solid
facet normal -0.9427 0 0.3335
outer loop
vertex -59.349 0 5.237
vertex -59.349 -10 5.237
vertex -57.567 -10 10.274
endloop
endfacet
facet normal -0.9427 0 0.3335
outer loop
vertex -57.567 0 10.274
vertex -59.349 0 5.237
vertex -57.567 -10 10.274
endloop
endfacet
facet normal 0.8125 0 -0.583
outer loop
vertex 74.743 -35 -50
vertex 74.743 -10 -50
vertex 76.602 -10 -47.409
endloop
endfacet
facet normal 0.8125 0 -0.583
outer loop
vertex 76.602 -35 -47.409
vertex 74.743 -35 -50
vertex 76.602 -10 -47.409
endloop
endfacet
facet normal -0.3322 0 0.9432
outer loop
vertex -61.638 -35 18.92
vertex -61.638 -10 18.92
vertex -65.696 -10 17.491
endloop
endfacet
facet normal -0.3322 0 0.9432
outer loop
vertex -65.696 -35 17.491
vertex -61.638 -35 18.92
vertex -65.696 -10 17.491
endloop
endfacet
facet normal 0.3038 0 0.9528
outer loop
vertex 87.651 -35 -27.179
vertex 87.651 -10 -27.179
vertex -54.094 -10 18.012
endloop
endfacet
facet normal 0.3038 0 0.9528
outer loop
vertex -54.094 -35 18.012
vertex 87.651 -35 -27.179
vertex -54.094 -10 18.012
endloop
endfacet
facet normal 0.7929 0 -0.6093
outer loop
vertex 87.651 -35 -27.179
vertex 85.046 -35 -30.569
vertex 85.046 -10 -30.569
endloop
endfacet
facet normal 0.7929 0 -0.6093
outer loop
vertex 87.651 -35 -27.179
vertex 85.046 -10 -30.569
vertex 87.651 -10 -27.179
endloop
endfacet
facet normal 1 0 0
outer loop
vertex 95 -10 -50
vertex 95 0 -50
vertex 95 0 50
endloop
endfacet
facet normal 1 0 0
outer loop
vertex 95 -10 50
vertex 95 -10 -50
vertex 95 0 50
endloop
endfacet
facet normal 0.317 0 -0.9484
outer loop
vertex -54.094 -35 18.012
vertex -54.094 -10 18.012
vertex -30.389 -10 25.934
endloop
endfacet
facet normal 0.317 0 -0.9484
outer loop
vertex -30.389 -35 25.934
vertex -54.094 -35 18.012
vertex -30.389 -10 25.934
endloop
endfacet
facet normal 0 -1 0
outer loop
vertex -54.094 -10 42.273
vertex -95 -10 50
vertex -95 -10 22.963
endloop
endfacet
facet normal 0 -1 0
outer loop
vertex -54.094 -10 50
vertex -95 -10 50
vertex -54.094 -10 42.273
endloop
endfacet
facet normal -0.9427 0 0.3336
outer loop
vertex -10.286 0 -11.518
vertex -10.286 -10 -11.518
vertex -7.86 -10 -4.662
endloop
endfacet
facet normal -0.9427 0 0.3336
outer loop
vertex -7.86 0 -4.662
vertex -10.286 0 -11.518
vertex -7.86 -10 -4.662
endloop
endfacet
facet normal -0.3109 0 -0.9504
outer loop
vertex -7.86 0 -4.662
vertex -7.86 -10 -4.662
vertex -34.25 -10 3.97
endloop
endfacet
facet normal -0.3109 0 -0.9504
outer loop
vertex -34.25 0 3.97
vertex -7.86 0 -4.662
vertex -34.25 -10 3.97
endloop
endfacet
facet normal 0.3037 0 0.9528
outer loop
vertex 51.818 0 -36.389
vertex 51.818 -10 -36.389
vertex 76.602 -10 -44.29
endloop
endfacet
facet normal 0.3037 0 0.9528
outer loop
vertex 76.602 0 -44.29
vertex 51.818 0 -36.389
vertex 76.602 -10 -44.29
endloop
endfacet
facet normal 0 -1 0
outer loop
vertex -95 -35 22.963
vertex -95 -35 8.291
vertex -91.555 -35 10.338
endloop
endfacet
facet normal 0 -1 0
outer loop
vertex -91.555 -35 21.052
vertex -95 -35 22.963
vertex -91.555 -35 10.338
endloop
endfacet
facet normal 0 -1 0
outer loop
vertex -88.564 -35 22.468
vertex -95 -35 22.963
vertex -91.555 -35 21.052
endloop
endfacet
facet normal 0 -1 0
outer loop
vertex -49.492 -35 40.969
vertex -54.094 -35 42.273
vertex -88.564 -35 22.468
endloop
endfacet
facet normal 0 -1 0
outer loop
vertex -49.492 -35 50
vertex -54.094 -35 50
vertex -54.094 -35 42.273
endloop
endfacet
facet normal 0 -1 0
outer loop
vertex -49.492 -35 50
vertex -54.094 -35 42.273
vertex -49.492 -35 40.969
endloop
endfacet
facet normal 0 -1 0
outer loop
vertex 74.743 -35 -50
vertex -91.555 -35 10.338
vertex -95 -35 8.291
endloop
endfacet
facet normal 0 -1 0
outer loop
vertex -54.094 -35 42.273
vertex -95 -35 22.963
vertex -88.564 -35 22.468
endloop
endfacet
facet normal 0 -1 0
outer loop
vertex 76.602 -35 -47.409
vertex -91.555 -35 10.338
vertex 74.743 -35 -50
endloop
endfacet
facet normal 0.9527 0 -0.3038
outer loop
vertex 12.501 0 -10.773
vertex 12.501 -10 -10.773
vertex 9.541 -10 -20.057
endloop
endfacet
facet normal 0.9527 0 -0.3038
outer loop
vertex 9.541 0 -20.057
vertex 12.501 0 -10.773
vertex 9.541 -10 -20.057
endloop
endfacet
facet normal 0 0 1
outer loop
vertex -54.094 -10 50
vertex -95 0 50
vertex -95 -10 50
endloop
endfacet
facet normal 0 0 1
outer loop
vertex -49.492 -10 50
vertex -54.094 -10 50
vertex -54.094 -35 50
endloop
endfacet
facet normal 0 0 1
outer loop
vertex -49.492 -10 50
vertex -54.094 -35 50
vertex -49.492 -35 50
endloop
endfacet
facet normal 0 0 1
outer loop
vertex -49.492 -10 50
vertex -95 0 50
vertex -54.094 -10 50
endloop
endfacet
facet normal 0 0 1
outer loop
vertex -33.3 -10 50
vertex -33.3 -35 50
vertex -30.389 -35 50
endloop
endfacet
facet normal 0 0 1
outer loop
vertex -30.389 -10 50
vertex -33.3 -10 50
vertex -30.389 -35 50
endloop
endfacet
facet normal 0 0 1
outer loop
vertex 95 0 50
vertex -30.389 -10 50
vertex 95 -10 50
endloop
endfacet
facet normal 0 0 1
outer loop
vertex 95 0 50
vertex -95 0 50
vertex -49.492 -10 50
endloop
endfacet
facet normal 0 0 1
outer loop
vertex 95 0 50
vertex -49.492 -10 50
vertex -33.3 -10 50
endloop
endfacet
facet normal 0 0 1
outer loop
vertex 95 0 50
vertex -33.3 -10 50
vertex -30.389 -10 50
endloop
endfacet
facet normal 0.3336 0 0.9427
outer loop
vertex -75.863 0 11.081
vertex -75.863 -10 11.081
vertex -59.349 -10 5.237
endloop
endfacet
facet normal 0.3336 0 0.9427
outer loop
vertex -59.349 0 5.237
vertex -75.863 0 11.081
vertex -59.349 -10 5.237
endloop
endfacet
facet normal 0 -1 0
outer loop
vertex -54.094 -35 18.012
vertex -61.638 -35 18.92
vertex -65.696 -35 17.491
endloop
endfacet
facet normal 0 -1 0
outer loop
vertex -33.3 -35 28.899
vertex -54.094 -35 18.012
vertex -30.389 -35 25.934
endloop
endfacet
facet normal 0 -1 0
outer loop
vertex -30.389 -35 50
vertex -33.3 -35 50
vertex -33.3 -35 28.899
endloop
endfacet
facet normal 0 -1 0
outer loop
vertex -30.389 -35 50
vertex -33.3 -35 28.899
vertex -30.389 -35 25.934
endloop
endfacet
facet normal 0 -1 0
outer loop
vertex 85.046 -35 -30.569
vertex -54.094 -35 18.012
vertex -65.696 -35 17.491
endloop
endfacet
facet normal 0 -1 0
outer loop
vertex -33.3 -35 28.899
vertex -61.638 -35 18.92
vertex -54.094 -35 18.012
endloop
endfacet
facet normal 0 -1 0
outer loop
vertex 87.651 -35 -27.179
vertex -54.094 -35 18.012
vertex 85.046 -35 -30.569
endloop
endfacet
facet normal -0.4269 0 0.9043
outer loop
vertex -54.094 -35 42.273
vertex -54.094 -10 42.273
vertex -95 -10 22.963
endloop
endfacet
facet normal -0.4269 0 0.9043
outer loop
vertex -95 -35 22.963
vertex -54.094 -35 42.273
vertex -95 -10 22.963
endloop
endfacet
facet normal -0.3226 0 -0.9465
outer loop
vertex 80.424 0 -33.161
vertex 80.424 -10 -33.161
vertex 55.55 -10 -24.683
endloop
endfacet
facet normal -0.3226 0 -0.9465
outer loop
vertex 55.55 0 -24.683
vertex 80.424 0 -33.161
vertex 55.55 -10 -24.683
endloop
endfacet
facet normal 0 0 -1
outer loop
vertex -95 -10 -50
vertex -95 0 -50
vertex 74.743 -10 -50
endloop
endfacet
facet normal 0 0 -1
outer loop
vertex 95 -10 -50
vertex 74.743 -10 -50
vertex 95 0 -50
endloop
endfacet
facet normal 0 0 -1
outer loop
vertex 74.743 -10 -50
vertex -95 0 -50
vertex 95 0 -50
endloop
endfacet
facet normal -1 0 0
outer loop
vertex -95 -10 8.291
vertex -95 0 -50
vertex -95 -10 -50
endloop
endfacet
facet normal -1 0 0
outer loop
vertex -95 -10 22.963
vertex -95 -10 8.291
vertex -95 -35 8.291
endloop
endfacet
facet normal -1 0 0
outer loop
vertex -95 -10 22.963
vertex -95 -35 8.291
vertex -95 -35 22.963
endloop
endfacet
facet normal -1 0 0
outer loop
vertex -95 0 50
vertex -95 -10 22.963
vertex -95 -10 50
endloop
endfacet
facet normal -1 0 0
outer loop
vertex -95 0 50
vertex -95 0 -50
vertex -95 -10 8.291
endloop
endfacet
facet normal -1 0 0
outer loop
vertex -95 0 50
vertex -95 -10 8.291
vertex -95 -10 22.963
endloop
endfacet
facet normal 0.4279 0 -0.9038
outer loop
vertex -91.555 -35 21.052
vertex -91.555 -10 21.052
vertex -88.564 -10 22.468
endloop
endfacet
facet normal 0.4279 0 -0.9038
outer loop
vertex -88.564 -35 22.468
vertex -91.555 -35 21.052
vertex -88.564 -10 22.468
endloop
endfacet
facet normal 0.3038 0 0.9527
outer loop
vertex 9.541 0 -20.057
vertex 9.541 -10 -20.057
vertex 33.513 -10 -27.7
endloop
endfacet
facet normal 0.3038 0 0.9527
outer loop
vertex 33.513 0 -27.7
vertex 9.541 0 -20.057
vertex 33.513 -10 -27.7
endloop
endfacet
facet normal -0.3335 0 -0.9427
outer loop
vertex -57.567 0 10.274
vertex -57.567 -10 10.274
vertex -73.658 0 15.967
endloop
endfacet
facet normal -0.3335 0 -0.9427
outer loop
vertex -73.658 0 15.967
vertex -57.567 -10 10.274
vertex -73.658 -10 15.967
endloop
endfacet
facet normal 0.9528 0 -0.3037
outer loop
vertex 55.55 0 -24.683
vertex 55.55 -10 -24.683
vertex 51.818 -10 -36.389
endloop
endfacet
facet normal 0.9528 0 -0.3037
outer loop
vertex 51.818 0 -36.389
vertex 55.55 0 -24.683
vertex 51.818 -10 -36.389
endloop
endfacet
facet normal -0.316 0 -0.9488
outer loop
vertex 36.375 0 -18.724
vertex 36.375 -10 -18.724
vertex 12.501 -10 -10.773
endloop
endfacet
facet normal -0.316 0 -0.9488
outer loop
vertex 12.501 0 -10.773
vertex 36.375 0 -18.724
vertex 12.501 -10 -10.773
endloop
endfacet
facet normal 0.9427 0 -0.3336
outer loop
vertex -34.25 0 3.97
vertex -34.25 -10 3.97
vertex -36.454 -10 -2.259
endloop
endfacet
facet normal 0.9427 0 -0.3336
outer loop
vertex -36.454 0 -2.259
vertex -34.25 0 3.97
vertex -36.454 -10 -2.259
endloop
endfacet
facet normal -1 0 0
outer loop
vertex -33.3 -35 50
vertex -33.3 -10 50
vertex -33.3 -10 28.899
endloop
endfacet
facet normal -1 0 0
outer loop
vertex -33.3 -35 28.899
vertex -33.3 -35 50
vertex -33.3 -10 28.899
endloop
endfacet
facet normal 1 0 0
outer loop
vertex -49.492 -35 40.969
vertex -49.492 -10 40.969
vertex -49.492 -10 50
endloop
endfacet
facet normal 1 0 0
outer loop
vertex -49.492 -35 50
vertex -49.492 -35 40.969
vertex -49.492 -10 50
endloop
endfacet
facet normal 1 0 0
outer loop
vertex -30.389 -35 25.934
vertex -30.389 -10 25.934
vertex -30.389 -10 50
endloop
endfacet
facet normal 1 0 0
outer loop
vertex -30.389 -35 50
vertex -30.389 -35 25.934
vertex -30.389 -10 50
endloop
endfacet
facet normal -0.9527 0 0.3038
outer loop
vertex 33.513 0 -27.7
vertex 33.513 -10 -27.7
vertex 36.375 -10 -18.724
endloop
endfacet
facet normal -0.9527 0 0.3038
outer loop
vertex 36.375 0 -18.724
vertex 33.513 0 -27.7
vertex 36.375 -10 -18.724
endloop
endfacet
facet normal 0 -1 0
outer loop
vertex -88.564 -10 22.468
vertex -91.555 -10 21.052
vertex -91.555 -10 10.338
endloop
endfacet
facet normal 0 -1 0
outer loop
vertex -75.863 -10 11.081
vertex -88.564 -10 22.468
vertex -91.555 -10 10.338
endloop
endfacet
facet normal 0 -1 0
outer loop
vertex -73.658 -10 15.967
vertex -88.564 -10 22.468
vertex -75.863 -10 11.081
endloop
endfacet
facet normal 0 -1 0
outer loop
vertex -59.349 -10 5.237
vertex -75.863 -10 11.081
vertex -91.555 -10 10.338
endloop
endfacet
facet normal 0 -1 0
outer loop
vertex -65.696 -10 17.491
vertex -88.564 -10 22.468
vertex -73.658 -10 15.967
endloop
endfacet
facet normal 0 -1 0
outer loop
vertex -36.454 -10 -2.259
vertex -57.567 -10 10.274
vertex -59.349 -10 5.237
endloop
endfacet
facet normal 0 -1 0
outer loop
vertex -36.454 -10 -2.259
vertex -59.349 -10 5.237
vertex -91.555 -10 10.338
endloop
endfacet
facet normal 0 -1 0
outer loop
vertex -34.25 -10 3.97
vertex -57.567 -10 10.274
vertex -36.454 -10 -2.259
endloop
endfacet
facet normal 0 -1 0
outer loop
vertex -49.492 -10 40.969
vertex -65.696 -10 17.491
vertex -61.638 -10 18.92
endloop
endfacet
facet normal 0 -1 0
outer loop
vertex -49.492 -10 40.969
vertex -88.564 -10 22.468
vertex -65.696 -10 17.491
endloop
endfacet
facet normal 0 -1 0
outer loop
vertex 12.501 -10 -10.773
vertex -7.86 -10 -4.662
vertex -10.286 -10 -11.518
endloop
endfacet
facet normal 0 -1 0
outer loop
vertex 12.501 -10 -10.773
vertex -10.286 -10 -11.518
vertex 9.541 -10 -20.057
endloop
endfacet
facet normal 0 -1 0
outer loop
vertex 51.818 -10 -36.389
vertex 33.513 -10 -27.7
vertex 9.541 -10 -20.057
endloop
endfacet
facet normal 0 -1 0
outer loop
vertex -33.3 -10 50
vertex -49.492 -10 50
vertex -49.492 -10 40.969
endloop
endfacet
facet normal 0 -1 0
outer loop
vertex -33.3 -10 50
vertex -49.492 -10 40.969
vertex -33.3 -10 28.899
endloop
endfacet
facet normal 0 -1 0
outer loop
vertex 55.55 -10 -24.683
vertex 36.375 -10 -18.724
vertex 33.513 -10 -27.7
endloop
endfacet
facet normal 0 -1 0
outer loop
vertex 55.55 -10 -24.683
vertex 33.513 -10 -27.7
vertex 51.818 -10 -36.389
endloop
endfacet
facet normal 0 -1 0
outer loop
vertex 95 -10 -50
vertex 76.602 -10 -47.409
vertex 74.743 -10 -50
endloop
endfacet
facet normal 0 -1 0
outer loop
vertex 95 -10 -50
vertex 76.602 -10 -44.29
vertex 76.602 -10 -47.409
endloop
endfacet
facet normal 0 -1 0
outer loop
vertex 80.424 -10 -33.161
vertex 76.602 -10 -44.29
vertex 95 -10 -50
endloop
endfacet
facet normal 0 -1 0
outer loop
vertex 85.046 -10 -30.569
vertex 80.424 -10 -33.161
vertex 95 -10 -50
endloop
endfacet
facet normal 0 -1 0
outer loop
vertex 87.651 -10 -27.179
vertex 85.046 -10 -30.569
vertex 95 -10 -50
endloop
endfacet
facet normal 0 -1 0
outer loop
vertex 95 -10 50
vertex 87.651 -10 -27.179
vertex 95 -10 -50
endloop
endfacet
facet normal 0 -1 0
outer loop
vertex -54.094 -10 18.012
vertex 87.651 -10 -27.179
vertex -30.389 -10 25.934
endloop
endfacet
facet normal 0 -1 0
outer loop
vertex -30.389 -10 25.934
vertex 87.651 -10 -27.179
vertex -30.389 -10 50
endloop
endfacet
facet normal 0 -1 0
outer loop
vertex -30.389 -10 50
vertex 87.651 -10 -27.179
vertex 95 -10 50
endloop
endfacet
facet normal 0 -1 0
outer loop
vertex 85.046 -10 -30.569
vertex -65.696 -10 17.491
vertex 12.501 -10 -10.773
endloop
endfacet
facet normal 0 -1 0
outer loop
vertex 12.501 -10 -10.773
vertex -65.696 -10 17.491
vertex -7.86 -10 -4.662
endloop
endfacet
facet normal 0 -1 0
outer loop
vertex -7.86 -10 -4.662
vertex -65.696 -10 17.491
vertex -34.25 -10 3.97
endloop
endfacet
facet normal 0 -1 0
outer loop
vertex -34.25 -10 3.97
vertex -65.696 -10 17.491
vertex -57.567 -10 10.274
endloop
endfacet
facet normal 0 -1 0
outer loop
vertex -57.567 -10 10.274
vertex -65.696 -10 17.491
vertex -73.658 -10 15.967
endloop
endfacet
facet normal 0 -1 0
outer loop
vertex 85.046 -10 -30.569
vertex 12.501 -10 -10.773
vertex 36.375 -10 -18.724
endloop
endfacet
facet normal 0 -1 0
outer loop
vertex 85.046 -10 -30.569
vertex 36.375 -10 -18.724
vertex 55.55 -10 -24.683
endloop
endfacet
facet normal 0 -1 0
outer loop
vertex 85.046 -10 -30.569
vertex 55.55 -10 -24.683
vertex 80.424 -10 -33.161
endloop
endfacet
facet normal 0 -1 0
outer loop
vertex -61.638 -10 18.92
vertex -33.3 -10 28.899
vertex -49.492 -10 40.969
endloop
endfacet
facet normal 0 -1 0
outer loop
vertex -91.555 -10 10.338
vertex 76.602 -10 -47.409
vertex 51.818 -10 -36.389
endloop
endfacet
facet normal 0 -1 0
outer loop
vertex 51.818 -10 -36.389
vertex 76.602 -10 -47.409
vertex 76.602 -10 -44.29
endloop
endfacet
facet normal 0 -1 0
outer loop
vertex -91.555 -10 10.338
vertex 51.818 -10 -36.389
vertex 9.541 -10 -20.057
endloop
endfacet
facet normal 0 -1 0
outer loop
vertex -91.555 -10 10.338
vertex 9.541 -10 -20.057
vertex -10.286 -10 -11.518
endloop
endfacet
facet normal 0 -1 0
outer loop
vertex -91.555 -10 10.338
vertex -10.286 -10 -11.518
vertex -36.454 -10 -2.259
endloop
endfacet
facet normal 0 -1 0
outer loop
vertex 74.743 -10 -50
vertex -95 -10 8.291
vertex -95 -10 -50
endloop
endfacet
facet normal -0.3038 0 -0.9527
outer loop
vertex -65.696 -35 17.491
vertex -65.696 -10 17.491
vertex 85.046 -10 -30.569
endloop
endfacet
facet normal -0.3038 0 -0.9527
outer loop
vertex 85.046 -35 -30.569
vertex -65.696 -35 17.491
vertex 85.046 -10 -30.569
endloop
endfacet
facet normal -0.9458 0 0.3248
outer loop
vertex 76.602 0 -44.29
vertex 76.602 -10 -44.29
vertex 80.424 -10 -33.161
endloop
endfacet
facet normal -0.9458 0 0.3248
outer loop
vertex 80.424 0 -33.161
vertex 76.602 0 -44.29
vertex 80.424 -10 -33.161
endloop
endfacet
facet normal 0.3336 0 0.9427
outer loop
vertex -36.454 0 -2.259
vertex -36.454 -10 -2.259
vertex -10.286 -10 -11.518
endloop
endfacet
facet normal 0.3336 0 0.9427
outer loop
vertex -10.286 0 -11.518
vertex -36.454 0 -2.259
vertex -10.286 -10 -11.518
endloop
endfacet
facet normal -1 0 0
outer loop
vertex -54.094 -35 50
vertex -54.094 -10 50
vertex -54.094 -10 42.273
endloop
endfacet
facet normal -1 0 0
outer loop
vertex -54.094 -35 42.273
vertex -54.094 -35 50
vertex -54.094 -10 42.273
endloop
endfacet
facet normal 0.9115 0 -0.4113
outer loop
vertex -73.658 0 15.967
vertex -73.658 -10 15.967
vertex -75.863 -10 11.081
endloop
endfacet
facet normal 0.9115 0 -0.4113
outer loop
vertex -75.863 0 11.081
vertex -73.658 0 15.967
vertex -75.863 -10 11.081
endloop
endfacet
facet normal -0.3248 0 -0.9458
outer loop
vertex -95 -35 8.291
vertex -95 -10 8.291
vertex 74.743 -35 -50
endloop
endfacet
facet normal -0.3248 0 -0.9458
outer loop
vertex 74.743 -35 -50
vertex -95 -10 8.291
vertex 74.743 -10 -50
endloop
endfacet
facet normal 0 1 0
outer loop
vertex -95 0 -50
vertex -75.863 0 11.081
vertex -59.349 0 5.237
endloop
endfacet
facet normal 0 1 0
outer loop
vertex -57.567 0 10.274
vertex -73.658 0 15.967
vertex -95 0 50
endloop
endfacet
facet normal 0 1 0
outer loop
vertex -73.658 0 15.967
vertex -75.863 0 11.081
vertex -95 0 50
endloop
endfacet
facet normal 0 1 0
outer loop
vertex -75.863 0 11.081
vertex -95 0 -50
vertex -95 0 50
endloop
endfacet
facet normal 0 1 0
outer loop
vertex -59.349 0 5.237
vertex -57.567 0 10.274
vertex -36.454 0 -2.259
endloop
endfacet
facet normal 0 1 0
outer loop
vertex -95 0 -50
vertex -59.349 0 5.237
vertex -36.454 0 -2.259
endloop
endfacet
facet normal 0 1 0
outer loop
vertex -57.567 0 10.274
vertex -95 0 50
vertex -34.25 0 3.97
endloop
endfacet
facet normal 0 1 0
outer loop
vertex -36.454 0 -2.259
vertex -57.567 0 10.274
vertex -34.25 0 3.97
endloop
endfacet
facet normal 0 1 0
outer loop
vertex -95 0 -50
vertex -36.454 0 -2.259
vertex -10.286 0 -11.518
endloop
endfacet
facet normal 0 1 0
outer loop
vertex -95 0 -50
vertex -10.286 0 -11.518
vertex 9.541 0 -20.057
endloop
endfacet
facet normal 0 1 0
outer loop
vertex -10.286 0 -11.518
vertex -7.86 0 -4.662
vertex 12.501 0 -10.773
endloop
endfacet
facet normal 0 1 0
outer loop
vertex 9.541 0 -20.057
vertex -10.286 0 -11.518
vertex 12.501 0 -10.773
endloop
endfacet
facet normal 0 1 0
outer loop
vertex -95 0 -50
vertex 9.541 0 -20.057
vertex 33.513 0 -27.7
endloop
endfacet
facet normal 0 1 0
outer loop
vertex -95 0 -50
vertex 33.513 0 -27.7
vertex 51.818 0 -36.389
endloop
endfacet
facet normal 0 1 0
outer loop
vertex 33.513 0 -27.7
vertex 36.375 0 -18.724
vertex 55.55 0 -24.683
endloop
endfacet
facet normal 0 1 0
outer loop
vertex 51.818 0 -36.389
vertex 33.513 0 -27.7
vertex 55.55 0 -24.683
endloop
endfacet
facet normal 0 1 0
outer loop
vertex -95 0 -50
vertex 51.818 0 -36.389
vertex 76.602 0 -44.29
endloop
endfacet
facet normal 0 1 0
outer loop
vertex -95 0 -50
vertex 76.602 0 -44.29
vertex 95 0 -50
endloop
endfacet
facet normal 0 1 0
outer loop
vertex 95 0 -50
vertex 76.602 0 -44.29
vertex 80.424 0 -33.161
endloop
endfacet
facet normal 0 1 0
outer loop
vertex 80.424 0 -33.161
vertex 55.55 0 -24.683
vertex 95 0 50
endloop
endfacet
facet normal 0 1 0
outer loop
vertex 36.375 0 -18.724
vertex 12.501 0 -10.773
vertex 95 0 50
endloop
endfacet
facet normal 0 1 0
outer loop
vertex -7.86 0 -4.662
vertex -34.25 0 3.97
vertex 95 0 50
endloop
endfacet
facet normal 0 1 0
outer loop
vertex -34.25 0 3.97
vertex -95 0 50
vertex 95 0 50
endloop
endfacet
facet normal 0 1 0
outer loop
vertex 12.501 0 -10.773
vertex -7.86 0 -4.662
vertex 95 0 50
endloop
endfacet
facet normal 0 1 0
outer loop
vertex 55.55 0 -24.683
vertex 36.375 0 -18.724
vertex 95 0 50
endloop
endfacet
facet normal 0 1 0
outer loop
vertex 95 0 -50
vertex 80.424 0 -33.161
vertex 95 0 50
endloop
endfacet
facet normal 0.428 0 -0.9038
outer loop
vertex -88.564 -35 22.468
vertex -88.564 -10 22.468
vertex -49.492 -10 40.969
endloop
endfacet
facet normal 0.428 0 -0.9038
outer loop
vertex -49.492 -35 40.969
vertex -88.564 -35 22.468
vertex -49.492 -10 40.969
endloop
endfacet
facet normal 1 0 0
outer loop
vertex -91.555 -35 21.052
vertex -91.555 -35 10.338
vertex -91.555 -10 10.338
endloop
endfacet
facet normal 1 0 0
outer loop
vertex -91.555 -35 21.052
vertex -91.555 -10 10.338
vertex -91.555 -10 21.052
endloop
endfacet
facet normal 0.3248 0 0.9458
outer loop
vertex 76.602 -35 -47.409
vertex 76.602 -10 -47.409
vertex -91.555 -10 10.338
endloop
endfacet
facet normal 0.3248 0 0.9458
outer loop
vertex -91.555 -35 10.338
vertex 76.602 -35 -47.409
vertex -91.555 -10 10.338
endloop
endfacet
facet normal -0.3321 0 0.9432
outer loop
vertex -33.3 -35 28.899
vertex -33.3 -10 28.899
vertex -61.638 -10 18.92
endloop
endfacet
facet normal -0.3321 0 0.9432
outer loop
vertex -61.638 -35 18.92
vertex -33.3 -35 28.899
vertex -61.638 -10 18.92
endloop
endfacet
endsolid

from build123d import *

# Parameters (mm, degrees)
F0_W     = 190
F0_H     = 100
F1_DEPTH = 10
F3_DEPTH = 25
F4_DEPTH = 25


with BuildPart() as f1:
    # F0 (on Front) → F1 (new body)
    with BuildSketch(Plane.XZ):
        Rectangle(F0_W, F0_H)
    extrude(amount=F1_DEPTH)

    # F2 (on face) → F3 (join)
    with BuildSketch(Plane.XZ.offset(10)):
        Polygon((-49.491931, 40.968843), (-49.491931, 50), (-54.094203, 50), (-54.094203, 42.272657), (-95, 22.963328), (-95, 8.291027), (74.74266, -50), (76.602353, -47.408584), (-91.554888, 10.337997), (-91.554888, 21.052278), (-88.564485, 22.468217), align=None)
        Polygon((-30.388942, 50), (-33.300221, 50), (-33.300221, 40.968843), (-33.300221, 28.898658), (-61.637774, 18.919959), (-65.695935, 17.490931), (85.04647, -30.56908), (87.651487, -27.179441), (-54.094203, 18.012218), (-30.388942, 25.933994), align=None)
    extrude(amount=F3_DEPTH)

    # F2 (on face) → F4 (cut)
    with BuildSketch(Plane.XZ.offset(10)):
        Polygon((-57.566985, 10.273552), (-73.658094, 15.96733), (-75.863337, 11.080531), (-59.349135, 5.237044), align=None)
        Polygon((-7.86031, -4.662096), (-34.249816, 3.969805), (-36.453794, -2.258826), (-10.286281, -11.518101), align=None)
        Polygon((36.374753, -18.724323), (12.500672, -10.772827), (9.540769, -20.056697), (33.513222, -27.699645), align=None)
        Polygon((80.424149, -33.161463), (55.549646, -24.682663), (51.817555, -36.388537), (76.602353, -44.290479), align=None)
    extrude(amount=-F4_DEPTH, mode=Mode.SUBTRACT)


solid = f1.part
